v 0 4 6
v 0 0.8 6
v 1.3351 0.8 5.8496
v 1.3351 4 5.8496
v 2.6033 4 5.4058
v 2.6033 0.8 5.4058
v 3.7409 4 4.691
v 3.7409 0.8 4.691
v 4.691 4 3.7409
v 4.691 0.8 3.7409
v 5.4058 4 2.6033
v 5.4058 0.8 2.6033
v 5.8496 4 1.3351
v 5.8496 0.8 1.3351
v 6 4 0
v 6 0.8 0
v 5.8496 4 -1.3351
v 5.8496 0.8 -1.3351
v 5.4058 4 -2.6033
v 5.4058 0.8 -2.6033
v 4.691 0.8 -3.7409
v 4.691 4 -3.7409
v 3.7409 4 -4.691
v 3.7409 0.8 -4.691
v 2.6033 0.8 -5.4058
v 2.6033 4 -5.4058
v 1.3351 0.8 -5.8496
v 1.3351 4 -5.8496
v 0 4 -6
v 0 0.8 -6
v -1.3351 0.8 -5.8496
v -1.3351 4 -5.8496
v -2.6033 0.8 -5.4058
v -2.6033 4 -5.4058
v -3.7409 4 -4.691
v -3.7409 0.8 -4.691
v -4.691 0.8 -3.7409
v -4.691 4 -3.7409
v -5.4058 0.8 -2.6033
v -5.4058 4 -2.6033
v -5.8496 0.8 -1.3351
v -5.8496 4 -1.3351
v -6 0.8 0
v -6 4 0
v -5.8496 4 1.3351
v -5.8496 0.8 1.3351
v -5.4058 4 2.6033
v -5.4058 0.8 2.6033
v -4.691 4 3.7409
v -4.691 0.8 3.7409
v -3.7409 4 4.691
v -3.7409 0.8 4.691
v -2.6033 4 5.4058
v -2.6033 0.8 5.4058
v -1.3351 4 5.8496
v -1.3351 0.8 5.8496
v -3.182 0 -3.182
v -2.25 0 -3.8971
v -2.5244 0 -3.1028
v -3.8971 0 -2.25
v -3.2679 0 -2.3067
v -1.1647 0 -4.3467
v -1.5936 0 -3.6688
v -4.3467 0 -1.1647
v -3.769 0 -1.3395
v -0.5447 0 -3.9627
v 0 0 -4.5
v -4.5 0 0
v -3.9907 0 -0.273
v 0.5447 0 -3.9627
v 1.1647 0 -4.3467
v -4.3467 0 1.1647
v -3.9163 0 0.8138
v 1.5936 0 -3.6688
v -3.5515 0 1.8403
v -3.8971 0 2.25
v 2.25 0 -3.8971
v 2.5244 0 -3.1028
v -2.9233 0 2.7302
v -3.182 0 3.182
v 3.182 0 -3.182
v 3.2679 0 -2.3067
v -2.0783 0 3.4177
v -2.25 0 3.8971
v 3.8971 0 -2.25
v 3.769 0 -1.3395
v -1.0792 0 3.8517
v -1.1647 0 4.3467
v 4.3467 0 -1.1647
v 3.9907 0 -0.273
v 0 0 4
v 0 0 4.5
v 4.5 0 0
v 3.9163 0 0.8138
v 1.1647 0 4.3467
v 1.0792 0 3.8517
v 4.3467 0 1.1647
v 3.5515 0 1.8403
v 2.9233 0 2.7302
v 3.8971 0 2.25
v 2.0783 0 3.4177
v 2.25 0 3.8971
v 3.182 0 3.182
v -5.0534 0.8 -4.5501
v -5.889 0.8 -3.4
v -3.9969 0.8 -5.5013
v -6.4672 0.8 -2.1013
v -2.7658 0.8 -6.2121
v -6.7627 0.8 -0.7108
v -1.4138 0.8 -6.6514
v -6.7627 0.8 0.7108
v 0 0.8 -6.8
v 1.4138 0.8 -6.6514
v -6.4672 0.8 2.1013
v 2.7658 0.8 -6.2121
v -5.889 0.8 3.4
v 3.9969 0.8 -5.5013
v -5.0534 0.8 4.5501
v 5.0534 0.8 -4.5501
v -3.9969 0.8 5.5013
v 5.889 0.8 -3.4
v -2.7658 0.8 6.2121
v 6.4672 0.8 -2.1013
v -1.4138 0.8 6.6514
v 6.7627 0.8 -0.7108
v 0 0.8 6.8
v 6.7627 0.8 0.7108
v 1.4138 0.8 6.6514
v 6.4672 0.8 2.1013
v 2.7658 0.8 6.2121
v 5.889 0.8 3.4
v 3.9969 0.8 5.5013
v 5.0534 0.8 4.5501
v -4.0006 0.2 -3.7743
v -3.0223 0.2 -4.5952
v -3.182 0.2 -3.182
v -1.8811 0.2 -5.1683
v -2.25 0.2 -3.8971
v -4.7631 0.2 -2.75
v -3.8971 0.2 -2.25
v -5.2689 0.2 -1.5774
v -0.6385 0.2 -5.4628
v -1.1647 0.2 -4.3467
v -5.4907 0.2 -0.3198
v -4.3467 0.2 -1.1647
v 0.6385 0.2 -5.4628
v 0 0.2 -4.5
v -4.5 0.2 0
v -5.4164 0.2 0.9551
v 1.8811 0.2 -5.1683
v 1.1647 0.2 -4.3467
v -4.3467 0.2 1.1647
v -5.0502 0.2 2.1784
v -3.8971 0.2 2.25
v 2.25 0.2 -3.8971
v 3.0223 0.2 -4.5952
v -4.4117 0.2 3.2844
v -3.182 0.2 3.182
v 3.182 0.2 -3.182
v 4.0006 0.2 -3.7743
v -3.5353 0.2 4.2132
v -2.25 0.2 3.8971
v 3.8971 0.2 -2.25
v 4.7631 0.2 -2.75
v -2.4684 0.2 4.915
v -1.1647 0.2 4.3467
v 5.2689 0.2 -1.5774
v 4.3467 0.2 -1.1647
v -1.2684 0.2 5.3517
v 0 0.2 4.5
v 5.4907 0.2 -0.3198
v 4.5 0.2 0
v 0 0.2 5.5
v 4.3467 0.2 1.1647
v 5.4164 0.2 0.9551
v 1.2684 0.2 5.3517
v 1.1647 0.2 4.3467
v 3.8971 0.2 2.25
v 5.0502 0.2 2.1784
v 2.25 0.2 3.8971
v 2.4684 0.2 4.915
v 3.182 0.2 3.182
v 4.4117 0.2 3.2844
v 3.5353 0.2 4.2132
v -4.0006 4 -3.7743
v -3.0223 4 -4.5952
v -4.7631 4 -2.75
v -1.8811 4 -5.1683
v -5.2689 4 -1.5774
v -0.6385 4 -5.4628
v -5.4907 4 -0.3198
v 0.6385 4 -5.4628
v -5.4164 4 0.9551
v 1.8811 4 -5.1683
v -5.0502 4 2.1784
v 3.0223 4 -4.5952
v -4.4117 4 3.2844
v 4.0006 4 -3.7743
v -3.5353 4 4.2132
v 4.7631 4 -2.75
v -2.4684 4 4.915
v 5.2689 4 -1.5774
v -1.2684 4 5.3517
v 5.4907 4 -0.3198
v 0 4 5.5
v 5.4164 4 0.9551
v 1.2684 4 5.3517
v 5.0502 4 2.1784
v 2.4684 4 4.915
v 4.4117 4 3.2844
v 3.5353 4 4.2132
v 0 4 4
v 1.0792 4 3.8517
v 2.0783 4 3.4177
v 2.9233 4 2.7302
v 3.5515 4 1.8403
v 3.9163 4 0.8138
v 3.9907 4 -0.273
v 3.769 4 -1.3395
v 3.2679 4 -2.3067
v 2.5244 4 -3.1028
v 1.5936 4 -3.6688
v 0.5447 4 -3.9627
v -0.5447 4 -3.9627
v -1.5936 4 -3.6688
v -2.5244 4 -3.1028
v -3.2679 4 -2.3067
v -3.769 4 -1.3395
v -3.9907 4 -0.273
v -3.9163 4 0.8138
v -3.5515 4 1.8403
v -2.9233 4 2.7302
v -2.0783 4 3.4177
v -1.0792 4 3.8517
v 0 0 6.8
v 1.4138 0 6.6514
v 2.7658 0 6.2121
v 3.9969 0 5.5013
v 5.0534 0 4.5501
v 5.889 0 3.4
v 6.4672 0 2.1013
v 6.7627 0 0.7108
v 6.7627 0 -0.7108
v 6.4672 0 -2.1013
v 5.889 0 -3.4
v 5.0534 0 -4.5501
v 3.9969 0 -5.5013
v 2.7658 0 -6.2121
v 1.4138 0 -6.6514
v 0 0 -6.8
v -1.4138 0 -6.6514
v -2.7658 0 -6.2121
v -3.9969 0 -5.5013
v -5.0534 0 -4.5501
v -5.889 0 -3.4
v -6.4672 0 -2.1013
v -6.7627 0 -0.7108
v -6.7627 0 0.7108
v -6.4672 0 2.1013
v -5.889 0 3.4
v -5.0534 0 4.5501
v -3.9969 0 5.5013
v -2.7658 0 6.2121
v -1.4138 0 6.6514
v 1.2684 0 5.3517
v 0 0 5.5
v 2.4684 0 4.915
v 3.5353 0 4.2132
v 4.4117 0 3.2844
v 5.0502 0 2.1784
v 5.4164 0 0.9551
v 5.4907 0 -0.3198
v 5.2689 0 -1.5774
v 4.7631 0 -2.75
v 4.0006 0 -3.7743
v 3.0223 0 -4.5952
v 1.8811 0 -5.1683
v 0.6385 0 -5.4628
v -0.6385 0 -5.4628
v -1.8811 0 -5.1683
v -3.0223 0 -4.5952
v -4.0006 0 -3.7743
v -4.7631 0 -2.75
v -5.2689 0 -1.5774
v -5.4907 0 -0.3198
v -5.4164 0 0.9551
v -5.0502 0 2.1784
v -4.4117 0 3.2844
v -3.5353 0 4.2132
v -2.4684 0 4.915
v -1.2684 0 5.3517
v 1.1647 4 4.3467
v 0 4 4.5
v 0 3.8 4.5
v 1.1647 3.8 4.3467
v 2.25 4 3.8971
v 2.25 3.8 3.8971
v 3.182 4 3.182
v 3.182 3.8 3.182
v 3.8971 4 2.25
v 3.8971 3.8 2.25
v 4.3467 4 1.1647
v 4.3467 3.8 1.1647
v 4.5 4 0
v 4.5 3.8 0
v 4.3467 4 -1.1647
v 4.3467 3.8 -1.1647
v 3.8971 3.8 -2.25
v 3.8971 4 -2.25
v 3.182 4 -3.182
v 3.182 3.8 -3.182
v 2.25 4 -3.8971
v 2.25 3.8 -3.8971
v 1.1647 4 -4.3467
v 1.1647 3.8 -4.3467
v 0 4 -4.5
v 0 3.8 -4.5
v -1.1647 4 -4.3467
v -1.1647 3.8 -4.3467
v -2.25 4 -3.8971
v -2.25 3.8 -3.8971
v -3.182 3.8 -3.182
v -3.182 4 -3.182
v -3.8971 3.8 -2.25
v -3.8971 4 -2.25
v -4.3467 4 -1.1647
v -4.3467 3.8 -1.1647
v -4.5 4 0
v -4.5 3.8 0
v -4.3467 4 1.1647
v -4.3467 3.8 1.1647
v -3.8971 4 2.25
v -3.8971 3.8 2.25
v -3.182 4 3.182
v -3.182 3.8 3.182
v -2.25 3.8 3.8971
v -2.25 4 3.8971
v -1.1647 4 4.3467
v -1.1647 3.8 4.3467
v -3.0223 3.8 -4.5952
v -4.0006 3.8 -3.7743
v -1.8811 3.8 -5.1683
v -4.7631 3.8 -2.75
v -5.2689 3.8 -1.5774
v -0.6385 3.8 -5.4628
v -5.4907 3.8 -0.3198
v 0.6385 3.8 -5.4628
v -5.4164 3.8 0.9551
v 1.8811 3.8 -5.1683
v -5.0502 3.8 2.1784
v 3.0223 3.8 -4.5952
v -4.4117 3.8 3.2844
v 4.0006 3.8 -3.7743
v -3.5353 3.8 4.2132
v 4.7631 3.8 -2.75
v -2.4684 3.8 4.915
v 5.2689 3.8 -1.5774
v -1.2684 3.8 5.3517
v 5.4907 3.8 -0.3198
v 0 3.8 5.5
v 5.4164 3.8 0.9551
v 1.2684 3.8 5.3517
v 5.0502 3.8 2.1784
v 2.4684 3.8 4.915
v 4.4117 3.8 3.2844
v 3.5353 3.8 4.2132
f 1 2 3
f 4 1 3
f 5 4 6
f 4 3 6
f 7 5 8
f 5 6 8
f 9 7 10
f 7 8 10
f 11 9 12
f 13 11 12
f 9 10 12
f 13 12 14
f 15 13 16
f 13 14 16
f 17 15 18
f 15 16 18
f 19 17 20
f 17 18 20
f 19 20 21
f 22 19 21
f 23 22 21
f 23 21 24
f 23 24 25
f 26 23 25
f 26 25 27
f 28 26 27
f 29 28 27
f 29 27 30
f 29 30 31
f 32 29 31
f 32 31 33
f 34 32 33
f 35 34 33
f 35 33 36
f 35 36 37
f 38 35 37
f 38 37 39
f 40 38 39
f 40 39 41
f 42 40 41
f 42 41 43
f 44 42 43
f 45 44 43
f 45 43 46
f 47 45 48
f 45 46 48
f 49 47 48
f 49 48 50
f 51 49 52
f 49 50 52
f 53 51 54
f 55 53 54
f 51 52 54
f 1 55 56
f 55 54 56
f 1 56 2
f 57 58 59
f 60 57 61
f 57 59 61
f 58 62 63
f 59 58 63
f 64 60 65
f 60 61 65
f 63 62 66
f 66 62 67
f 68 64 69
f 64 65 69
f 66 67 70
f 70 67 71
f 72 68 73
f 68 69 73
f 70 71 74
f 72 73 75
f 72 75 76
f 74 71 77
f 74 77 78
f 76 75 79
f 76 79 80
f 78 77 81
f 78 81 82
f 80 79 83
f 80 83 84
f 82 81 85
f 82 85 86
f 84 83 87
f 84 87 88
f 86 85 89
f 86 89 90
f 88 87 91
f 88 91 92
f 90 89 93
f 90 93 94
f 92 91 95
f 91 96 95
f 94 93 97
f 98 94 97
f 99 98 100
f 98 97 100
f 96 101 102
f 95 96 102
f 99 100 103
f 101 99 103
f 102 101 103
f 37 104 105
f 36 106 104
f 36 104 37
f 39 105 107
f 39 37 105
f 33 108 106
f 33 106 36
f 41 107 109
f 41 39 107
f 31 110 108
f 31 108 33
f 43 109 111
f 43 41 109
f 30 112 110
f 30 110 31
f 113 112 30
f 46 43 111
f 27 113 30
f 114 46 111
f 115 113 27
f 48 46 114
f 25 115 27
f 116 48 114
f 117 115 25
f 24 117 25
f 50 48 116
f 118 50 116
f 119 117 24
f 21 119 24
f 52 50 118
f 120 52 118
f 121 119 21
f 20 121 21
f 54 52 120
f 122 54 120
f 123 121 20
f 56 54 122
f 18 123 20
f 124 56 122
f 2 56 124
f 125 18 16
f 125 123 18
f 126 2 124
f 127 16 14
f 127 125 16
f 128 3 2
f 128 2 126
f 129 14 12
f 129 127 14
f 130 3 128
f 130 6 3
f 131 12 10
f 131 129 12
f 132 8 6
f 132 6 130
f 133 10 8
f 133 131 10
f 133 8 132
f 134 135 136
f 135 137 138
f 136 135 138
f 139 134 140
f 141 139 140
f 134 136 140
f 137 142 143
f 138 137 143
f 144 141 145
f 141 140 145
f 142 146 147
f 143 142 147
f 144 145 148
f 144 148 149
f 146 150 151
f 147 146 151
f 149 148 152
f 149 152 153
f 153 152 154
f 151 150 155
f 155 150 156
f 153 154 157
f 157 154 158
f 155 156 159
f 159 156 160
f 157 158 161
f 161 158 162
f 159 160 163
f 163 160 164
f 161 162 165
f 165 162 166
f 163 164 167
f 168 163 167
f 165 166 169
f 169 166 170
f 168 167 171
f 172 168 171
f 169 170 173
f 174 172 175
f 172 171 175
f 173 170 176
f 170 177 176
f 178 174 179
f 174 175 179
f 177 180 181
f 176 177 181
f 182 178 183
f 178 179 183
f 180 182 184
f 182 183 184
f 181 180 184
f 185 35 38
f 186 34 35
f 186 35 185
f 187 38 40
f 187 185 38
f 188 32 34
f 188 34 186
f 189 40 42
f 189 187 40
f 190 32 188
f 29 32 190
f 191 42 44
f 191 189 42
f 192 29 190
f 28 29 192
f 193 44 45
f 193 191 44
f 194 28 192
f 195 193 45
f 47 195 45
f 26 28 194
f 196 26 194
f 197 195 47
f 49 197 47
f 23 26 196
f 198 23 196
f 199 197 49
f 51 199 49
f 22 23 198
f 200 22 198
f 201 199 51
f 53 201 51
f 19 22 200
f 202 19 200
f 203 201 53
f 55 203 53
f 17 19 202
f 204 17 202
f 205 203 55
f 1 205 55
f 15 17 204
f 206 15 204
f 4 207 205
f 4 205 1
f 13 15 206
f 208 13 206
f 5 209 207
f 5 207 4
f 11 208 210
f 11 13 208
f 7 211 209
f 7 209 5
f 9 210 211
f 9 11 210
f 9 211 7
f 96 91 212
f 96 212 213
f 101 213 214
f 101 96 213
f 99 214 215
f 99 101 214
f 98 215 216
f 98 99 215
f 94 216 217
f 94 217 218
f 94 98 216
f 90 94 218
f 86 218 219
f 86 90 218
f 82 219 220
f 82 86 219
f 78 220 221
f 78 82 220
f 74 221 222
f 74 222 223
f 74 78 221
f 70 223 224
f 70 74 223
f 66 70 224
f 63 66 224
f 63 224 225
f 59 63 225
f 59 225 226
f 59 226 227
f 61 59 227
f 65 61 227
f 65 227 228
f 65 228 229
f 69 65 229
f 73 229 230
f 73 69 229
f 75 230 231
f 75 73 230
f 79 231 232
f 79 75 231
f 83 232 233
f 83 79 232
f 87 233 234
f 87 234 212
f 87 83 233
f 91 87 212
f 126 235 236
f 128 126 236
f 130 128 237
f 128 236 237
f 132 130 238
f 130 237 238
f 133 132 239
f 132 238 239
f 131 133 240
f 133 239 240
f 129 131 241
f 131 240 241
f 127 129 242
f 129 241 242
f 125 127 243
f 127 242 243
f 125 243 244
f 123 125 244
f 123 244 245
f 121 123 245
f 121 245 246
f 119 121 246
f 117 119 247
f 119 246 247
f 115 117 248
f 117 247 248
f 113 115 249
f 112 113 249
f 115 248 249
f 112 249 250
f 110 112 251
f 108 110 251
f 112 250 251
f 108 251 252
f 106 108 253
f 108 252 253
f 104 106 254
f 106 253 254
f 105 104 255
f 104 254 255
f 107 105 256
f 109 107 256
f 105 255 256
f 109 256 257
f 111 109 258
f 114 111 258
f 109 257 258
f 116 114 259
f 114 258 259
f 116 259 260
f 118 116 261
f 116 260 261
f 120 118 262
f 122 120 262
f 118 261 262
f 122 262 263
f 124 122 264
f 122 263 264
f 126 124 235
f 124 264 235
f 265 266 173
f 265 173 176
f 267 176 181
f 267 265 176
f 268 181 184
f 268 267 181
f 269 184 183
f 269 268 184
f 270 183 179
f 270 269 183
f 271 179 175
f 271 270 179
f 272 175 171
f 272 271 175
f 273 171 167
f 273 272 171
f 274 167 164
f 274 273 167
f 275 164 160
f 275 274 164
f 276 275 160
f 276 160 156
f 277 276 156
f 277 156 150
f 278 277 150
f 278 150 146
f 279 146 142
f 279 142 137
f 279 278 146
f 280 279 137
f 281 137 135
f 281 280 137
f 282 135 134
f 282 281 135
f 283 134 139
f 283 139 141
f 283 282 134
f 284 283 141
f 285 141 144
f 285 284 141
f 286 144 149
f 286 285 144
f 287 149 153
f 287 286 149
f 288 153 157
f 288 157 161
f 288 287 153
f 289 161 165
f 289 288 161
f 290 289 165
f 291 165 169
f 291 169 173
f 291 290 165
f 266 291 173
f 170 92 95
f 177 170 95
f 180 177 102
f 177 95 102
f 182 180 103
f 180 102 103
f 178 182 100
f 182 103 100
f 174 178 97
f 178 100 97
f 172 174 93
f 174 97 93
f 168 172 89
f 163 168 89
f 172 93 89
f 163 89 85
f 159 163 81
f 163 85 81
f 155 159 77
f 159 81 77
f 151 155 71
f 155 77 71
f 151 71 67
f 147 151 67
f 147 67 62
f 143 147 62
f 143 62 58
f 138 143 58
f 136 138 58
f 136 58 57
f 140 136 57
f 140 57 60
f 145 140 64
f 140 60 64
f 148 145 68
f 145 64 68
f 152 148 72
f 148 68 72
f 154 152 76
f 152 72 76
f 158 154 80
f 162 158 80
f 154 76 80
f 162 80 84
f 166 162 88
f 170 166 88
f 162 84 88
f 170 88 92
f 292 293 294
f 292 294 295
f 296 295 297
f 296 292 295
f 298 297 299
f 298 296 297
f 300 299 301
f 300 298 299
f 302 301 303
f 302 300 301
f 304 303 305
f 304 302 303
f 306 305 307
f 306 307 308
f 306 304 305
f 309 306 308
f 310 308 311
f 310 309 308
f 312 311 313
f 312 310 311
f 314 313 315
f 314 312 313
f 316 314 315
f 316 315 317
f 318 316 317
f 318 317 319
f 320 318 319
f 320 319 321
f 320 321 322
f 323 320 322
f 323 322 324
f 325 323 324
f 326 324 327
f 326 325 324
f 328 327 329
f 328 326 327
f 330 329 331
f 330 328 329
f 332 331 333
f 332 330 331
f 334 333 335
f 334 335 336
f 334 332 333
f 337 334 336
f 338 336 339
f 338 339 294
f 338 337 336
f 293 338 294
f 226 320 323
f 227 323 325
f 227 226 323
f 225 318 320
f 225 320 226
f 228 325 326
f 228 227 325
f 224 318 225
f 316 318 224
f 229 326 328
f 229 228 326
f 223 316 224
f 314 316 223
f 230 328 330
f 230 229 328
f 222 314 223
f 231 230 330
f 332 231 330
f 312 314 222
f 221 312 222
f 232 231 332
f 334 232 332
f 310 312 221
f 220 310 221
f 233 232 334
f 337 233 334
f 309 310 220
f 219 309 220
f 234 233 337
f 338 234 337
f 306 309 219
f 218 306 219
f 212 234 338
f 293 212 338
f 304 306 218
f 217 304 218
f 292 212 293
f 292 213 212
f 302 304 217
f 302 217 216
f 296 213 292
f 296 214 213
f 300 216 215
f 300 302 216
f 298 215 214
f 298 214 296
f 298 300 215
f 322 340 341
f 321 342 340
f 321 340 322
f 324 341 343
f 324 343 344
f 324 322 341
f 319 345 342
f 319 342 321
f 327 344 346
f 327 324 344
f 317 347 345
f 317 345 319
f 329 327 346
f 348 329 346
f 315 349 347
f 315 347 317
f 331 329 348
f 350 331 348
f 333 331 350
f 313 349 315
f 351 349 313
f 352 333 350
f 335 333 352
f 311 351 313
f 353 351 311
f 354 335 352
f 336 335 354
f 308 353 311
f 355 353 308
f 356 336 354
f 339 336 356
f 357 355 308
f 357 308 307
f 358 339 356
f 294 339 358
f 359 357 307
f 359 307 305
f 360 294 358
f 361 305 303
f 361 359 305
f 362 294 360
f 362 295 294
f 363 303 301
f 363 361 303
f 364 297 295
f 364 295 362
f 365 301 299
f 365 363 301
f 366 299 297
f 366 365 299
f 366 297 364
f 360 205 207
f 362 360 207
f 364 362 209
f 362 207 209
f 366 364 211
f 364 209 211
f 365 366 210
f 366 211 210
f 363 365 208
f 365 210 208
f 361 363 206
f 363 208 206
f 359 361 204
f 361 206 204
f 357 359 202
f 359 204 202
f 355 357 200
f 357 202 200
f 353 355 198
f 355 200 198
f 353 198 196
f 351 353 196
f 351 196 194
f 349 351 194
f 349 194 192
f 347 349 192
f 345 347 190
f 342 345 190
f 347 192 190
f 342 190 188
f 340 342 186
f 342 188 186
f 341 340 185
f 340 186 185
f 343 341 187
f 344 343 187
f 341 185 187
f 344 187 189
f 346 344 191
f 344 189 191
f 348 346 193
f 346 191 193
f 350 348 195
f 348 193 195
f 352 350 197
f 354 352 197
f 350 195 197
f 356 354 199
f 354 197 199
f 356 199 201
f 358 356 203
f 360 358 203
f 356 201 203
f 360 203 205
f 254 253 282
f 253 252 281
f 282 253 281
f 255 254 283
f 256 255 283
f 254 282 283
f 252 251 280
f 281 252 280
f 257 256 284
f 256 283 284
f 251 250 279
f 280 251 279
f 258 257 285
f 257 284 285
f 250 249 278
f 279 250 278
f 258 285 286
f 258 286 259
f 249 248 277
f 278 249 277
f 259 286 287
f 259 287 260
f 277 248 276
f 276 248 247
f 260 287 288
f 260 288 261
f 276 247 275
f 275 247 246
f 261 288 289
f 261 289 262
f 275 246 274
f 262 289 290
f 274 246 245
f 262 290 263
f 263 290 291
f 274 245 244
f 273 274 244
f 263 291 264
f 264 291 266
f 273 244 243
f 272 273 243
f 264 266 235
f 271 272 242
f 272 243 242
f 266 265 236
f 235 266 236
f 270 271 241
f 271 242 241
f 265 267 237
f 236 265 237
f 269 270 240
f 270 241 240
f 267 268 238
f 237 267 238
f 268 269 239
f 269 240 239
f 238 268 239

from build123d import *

# Parameters (mm, degrees)
SKETCH_1_R          = 6
SKETCH_1_R_2        = 4
EXTRUDE_1_DEPTH     = 4
SKETCH_2_R          = 6.8
SKETCH_2_R_2        = 6
EXTRUDE_2_DEPTH     = 0.8
SKETCH_3_R          = 5.5
SKETCH_3_R_2        = 4.5
CUT_EXTRUDE_1_DEPTH = 0.2


with BuildPart() as part:
    # 草图1 → 凸台-拉伸1 (new body)
    with BuildSketch(Plane(origin=(0, 0, 0), x_dir=(1, 0, 0), z_dir=(0, 1, 0))):
        with Locations(Location((0, 0, 0), (0, 0, 270))):
            Circle(SKETCH_1_R)
        with Locations(Location((0, 0, 0), (0, 0, 270))):
            Circle(SKETCH_1_R_2, mode=Mode.SUBTRACT)
    extrude(amount=EXTRUDE_1_DEPTH)

    # 草图2 → 凸台-拉伸2 (add)
    with BuildSketch(Plane(origin=(0, 0, 0), x_dir=(1, 0, 0), z_dir=(0, 1, 0))):
        with Locations(Location((0, 0, 0), (0, 0, 270))):
            Circle(SKETCH_2_R)
        with Locations(Location((0, 0, 0), (0, 0, 270))):
            Circle(SKETCH_2_R_2, mode=Mode.SUBTRACT)
    extrude(amount=EXTRUDE_2_DEPTH)

    # 草图3 → 切除-拉伸1 (cut)
    with BuildSketch(Plane(origin=(0, 4, 0), x_dir=(1, 0, 0), z_dir=(0, 1, 0))):
        with Locations(Location((0, 0, 0), (0, 0, 270))):
            Circle(SKETCH_3_R)
        with Locations(Location((0, 0, 0), (0, 0, 270))):
            Circle(SKETCH_3_R_2, mode=Mode.SUBTRACT)
    cut_extrude_1 = extrude(amount=-CUT_EXTRUDE_1_DEPTH, mode=Mode.SUBTRACT)

    # 镜向1: 切除-拉伸1 across plane
    add(cut_extrude_1.mirror(Plane.ZX.offset(2)), mode=Mode.SUBTRACT)


solid = part.part
